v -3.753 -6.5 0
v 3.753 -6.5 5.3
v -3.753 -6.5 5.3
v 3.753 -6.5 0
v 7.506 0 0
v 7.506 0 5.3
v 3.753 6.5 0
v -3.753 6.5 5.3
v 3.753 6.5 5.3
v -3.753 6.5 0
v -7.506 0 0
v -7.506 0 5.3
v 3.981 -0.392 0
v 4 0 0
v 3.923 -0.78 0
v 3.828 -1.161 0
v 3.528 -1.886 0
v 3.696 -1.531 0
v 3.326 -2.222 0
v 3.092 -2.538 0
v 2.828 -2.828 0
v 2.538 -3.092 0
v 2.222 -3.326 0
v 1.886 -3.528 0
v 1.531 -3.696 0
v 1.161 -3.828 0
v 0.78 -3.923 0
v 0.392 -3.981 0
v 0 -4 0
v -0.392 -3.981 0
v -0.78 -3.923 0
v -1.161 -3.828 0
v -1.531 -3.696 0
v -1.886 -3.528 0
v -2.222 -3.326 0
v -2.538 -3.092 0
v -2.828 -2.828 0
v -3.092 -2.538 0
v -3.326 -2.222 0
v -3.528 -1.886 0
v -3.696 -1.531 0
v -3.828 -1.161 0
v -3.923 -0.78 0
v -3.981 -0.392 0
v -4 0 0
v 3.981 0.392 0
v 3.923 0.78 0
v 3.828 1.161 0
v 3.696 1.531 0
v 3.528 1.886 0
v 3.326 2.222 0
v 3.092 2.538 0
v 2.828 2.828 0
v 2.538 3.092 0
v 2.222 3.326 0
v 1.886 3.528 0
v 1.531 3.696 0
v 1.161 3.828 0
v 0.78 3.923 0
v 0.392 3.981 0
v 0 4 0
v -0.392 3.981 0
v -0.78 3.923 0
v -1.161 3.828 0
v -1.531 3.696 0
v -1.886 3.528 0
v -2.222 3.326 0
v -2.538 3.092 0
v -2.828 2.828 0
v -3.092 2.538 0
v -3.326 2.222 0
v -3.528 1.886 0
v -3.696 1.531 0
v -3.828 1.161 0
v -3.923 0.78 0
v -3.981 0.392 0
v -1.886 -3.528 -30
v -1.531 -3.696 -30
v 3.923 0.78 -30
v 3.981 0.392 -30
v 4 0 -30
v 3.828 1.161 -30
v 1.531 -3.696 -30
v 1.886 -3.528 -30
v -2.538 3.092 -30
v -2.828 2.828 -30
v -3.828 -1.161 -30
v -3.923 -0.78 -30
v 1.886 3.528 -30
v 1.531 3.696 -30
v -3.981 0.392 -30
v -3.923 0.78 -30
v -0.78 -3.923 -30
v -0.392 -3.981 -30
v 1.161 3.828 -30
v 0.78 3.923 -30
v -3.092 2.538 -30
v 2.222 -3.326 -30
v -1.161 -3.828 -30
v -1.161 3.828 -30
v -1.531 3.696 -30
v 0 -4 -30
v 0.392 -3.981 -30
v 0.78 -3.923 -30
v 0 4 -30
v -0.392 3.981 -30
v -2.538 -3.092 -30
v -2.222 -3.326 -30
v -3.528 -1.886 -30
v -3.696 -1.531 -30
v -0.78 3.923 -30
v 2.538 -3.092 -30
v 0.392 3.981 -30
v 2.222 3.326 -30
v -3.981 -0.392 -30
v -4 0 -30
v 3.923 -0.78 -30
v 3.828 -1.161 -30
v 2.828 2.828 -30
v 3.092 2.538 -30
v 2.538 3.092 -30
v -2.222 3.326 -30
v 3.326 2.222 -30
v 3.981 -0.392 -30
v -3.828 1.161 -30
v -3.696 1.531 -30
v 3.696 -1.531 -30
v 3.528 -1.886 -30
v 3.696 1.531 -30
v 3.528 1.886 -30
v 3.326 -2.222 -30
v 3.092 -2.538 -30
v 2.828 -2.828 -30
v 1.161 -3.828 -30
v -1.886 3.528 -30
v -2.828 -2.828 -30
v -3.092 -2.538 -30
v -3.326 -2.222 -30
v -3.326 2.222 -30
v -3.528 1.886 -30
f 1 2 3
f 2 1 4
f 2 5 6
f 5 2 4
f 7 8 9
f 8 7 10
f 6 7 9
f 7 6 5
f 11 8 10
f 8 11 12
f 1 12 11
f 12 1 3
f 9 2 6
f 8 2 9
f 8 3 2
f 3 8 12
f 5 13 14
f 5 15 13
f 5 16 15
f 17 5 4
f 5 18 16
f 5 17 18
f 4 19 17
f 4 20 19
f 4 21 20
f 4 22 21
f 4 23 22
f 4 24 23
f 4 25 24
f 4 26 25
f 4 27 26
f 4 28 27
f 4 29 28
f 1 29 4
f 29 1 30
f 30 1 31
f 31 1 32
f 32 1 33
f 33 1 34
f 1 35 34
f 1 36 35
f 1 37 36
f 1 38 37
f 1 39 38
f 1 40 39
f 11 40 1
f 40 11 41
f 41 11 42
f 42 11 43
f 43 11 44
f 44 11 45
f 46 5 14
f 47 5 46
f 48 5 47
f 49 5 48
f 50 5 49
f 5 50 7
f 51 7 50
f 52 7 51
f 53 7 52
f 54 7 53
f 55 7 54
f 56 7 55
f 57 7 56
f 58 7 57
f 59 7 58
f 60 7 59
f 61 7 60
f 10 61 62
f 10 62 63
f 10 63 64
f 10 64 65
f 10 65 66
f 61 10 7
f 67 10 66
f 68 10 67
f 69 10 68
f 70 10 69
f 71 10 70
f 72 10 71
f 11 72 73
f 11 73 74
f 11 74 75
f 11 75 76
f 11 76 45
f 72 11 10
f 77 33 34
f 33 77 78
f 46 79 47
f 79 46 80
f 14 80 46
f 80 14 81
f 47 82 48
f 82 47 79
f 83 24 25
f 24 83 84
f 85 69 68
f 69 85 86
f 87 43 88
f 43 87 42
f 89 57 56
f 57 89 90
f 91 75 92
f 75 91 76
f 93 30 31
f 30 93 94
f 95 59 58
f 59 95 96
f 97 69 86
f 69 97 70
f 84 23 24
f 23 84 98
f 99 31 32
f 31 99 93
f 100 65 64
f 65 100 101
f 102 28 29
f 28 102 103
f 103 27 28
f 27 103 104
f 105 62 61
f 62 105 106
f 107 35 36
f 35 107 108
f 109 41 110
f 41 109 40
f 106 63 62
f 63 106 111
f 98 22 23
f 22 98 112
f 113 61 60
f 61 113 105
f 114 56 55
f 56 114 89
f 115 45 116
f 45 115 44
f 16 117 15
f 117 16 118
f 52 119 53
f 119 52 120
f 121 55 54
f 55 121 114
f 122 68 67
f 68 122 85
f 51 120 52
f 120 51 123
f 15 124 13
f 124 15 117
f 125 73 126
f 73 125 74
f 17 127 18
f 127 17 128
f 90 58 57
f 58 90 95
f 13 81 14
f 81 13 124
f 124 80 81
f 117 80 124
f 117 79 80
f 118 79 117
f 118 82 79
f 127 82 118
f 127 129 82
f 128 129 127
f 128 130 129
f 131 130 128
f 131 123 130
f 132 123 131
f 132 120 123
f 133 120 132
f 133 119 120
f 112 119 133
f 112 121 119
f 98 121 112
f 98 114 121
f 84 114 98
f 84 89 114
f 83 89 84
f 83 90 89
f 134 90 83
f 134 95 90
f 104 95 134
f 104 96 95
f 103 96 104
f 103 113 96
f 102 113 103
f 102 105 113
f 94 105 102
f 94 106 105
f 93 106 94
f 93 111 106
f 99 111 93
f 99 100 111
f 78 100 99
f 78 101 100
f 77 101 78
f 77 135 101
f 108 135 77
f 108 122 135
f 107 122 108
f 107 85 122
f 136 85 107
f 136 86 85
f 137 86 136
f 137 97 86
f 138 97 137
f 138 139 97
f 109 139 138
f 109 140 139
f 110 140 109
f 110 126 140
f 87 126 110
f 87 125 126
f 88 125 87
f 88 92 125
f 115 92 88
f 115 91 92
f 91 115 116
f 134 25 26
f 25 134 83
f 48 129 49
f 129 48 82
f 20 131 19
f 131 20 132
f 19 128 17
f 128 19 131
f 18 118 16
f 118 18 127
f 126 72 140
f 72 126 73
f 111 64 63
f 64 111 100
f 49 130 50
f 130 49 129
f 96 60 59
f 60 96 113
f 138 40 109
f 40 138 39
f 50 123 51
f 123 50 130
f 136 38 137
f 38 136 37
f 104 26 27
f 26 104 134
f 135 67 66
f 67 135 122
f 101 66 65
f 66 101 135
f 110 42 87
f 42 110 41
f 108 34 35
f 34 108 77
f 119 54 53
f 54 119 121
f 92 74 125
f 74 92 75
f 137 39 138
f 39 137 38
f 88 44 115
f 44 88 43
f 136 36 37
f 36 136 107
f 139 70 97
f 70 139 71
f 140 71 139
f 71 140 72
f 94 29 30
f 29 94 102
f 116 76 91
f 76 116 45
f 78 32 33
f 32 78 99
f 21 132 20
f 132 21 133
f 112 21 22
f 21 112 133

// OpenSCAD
$fn = 64;

module m8_hex_bolt() {
    union() {
        // Head: hexagonal prism, across-flats 13mm, height 5.3mm
        // cylinder($fn=6) uses the circumscribed radius, so convert from across-flats.
        translate([0, 0, 0])
            cylinder(h = 5.3, r = 13 / (2 * cos(30)), $fn = 6);

        // Shank: cylindrical shaft, diameter 8mm, length 30mm
        // Head bottom at z=0, shank extends toward negative Z.
        translate([0, 0, -30])
            cylinder(h = 30, d = 8);
    }
}

m8_hex_bolt();
